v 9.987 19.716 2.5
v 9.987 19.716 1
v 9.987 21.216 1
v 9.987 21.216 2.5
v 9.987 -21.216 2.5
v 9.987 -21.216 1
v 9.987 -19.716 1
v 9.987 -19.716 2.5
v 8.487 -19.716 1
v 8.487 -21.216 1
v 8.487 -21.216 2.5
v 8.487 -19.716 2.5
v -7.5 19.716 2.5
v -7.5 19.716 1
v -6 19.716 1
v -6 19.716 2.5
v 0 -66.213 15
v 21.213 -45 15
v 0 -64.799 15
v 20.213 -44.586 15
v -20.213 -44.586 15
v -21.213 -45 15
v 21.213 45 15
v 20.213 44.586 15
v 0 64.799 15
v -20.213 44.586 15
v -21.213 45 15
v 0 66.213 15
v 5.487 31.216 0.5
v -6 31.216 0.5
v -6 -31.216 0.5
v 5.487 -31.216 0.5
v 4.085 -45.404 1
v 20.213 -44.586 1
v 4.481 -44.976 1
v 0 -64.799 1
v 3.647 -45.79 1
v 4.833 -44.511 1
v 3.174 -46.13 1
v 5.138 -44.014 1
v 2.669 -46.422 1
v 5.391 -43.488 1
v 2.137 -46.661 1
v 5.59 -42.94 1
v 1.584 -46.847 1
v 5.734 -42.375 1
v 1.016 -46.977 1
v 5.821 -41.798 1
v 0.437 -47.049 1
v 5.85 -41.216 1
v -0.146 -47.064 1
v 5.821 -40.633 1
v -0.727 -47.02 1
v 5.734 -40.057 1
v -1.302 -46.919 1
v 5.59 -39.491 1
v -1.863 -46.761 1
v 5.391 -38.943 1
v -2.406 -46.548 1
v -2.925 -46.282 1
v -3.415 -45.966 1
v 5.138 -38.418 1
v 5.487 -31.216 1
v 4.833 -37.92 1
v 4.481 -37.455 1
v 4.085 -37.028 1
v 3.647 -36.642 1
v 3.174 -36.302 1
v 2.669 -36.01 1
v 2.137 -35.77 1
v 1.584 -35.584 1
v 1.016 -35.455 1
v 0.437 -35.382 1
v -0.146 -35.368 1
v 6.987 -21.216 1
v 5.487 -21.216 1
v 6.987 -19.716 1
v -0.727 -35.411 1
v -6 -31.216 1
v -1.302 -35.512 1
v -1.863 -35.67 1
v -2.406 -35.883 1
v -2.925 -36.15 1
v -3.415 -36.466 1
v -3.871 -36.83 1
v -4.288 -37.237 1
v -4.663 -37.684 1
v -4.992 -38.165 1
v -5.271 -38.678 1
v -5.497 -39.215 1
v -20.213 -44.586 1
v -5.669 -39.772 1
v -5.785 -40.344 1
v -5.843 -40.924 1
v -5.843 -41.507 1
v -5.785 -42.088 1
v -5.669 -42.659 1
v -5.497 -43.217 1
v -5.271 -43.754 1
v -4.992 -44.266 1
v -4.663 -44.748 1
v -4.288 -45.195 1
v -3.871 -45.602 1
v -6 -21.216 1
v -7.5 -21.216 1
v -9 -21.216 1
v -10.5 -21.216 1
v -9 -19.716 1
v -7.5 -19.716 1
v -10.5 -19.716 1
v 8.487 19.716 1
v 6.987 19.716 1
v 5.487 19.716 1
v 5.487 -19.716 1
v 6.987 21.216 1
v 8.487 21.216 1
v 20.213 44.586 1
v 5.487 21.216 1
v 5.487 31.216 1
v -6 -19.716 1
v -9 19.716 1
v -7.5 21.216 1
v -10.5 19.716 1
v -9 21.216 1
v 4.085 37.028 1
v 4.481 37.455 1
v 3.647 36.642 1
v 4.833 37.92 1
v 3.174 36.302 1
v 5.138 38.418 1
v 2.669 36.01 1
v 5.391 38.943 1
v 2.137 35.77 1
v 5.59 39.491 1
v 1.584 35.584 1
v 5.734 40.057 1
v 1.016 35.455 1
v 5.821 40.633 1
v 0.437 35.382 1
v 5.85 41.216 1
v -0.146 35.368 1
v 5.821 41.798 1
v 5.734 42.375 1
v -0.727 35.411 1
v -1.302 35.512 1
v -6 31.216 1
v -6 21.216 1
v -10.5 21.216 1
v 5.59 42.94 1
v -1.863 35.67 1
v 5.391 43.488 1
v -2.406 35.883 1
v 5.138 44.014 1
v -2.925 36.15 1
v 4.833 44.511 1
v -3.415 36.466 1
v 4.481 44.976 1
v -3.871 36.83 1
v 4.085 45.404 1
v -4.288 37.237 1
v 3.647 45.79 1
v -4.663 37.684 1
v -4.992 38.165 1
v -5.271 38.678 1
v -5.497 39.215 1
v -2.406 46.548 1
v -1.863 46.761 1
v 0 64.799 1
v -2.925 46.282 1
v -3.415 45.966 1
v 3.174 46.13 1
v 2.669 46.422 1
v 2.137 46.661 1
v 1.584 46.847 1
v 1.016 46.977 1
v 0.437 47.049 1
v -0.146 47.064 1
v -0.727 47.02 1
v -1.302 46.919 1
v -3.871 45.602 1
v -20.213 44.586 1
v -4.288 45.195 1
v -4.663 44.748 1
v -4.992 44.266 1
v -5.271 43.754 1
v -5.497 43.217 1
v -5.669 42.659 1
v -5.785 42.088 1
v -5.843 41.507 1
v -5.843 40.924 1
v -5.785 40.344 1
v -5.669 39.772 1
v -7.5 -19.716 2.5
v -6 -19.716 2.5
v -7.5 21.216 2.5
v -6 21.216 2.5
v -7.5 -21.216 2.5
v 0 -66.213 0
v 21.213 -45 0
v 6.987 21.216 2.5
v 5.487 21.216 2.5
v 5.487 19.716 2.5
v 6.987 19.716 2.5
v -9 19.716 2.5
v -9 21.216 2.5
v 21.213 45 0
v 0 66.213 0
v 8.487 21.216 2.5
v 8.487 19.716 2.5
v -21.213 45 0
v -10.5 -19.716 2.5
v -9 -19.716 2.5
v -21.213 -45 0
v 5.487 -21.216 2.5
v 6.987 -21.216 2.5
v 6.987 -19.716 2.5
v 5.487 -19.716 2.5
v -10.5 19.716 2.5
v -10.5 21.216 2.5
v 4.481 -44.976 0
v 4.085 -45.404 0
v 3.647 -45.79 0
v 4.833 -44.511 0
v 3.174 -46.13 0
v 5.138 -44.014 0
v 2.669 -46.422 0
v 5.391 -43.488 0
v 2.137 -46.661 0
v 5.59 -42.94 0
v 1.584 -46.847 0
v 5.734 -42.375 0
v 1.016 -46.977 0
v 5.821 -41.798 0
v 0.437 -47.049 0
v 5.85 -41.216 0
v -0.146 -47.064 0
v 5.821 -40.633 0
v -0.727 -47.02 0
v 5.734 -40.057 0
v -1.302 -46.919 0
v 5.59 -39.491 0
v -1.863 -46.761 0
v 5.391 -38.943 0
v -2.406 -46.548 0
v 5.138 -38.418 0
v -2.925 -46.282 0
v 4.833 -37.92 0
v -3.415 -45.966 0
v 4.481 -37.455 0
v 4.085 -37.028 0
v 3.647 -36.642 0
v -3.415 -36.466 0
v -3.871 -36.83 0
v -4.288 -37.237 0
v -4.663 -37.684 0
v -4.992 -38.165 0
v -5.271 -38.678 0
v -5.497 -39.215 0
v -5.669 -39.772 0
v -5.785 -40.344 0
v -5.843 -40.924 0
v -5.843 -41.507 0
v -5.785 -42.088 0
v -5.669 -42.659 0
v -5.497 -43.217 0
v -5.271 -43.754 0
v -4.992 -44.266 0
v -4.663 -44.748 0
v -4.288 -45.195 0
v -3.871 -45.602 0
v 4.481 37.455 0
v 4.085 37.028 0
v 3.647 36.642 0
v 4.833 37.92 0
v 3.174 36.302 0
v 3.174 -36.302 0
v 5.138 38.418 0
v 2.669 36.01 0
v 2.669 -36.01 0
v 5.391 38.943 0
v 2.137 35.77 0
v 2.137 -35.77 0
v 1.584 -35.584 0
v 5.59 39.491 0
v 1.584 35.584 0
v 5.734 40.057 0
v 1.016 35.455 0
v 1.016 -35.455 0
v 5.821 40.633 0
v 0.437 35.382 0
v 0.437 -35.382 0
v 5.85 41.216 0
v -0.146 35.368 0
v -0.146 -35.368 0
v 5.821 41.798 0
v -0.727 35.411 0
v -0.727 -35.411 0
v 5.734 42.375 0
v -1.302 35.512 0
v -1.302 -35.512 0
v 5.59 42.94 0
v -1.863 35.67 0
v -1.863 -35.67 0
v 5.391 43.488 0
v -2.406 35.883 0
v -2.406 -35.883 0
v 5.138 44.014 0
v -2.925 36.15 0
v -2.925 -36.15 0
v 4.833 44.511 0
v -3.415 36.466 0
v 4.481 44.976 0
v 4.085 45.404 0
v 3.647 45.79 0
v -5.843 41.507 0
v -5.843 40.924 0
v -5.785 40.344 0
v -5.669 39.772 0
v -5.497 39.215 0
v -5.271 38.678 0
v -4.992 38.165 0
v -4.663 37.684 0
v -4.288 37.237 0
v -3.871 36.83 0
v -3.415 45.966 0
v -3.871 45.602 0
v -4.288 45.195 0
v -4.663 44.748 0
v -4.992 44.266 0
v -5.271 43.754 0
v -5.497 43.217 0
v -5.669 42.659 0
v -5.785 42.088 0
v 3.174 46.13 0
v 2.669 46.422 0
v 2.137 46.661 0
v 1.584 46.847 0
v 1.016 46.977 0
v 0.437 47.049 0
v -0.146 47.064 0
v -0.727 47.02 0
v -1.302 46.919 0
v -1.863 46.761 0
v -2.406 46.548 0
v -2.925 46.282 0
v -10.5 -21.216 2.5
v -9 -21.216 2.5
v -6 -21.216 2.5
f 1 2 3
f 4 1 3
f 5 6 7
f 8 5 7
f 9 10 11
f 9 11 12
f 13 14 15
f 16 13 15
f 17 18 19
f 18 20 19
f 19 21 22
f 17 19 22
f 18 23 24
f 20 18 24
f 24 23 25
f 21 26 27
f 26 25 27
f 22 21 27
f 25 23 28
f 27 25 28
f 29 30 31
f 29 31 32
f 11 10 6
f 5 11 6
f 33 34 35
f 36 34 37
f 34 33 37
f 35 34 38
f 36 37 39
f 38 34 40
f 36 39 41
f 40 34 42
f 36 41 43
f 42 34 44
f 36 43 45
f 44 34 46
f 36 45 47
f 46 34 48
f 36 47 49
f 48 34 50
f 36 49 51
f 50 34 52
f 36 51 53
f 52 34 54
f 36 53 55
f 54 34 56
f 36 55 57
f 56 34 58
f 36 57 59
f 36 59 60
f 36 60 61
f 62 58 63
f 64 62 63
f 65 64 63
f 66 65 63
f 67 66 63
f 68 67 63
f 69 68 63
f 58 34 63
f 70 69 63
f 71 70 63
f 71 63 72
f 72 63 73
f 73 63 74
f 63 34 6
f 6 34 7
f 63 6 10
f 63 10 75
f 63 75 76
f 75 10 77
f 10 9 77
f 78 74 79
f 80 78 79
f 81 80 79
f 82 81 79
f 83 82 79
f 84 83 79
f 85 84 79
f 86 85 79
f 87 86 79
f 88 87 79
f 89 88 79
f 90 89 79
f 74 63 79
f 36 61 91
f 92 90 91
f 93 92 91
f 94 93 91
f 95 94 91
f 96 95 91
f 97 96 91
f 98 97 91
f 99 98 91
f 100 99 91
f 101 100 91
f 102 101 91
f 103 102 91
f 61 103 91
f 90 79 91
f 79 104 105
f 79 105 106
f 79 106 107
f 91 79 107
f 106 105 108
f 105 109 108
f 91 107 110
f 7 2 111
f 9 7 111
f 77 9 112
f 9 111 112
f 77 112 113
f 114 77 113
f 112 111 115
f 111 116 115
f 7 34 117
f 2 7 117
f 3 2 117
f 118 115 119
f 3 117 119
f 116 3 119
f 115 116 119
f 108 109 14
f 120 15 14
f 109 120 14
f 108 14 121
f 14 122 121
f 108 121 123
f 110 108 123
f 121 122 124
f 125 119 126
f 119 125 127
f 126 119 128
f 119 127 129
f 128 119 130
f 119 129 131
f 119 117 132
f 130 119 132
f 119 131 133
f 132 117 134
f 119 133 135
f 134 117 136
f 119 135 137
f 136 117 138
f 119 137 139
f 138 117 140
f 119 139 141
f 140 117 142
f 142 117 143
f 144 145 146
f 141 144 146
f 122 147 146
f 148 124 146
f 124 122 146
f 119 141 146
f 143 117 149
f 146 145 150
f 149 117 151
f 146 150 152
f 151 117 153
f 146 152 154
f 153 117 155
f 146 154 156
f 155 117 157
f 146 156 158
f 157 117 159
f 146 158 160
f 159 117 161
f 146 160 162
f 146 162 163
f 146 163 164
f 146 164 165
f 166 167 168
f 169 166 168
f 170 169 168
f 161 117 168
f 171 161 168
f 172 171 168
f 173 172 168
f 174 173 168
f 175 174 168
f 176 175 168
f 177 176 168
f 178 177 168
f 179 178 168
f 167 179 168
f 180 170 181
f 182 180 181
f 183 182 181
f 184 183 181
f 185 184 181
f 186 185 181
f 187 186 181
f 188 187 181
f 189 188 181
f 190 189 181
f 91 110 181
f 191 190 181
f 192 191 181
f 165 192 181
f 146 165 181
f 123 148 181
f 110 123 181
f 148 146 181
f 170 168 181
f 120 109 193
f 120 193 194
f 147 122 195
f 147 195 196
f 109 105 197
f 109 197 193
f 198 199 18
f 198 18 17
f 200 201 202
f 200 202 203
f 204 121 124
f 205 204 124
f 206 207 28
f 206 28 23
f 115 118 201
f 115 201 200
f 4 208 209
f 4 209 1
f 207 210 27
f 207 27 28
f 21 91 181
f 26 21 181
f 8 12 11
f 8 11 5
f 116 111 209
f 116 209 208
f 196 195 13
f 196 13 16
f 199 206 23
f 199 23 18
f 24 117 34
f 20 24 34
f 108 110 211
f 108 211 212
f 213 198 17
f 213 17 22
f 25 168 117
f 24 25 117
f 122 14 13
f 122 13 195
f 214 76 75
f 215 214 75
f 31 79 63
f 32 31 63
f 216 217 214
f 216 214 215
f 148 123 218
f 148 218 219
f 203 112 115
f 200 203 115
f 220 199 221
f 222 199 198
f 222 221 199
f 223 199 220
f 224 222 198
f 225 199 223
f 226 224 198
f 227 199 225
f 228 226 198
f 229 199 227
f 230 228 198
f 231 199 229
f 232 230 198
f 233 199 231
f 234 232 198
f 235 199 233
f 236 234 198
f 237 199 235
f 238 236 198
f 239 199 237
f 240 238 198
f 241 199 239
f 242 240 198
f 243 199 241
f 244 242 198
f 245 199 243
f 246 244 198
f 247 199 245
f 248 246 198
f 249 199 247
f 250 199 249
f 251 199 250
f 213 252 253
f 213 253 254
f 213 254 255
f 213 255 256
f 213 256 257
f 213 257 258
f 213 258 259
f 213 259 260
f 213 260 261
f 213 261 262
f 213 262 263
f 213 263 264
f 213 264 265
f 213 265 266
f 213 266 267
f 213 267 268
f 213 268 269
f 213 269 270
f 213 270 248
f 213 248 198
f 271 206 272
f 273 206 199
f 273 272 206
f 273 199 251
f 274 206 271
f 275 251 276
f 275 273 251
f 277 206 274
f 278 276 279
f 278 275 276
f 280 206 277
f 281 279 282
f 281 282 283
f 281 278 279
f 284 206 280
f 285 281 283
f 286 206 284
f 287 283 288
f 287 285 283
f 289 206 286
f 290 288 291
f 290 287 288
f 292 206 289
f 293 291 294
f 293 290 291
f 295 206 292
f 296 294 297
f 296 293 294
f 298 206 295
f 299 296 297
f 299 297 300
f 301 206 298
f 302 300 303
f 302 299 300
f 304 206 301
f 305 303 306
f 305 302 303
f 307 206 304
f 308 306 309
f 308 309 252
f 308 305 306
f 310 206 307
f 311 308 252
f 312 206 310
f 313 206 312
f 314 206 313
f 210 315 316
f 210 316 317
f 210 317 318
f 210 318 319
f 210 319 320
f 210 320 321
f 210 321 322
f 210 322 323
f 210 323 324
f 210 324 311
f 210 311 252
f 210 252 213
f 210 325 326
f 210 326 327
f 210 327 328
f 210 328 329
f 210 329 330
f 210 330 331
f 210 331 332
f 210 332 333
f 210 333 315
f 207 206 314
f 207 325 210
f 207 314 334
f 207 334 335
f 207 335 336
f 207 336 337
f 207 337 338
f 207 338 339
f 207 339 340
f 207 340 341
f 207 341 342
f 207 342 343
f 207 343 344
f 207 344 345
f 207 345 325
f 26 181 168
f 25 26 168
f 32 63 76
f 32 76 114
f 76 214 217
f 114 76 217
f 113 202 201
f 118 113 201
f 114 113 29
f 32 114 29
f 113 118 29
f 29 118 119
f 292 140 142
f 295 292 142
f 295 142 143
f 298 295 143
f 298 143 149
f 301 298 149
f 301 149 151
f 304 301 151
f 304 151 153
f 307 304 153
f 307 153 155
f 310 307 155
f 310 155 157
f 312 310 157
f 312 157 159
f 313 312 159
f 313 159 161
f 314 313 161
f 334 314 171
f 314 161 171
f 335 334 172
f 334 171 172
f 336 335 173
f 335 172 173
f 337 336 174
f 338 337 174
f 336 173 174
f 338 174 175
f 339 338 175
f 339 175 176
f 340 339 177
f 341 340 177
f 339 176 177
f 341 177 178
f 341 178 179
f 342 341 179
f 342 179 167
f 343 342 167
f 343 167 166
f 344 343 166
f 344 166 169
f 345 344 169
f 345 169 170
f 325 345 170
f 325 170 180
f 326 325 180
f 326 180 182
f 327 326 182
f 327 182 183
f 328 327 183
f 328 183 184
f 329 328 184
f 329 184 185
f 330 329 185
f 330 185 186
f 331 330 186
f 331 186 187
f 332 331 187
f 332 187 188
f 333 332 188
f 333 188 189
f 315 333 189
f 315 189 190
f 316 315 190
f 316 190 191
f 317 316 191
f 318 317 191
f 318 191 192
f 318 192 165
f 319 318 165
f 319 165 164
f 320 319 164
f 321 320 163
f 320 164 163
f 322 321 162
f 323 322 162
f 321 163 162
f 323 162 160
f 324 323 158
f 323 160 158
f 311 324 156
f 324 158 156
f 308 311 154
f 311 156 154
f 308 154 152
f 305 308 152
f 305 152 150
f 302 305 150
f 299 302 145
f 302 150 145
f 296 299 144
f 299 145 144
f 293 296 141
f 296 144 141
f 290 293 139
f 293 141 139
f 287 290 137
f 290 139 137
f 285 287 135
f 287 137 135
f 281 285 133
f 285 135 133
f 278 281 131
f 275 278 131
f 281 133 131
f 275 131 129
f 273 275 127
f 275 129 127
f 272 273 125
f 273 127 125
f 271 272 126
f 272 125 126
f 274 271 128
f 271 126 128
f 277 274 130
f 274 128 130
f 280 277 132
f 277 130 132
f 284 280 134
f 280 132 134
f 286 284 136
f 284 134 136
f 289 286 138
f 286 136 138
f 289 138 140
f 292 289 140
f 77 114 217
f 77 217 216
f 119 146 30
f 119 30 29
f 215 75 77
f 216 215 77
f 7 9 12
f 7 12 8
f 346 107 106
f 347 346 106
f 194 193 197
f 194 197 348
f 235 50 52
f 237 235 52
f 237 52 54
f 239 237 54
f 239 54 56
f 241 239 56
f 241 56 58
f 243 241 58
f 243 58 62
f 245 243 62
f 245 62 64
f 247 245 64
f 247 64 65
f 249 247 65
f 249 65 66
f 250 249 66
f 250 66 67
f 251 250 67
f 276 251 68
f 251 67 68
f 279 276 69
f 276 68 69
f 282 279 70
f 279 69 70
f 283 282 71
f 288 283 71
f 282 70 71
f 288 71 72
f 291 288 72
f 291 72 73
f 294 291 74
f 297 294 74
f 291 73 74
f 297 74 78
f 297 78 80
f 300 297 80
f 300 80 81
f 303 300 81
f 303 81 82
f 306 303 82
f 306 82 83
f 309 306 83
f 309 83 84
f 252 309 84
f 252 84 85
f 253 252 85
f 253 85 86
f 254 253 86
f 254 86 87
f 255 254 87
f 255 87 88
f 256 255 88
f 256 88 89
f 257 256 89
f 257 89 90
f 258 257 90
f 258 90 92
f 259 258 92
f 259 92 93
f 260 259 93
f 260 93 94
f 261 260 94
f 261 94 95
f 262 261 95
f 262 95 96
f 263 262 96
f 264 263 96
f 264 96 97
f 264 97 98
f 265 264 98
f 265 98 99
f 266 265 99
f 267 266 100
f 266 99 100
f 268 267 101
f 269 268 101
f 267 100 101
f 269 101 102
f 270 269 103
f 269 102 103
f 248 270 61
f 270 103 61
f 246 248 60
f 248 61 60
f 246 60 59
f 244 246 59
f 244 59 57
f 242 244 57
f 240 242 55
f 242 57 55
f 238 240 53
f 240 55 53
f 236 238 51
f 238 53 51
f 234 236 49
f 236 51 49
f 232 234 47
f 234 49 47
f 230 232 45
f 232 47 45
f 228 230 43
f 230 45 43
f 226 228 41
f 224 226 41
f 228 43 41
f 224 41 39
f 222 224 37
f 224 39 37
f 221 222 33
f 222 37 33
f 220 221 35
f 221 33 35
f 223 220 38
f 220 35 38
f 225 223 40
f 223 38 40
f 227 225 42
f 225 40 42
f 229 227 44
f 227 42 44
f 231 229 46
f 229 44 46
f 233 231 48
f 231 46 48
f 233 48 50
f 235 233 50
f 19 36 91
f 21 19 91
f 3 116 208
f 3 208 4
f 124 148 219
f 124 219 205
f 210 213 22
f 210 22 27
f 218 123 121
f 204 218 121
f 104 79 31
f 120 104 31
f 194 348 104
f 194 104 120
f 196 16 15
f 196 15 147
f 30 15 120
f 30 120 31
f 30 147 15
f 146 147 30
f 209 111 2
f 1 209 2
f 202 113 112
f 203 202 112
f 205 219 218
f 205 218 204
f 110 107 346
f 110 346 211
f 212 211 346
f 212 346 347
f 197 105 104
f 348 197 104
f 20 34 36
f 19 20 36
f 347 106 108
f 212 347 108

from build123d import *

# Parameters (mm, degrees)
EXTRUDE_3_DEPTH                 = 15
EXTRUDE_2_DEPTH                 = 1
SKETCH_4_R                      = 5.85
CUT_EXTRUDE_1_DEPTH             = 2
SKIZZE1_W                       = 11.487069154
SKIZZE1_H                       = 62.431572876
SCHNITT_LINEAR_AUSTRAGEN1_DEPTH = 0.5
SKIZZE2_W                       = 1.5
SKIZZE2_H                       = 1.5
AUFSATZ_LINEAR_AUSTRAGEN1_DEPTH = 1.5


with BuildPart() as part:
    # Эскиз1 → Вытянуть-Тонкостенный3 (new body)
    with BuildSketch(Plane.XY):
        Polygon((-21.213203436, -45), (-21.213203436, 45), (0, 66.213203436), (21.213203436, 45), (21.213203436, -45), (0, -66.213203436), align=None)
        Polygon((-20.213203436, -44.585786438), (-20.213203436, 44.585786438), (0, 64.798989873), (20.213203436, 44.585786438), (20.213203436, -44.585786438), (0, -64.798989873), align=None, mode=Mode.SUBTRACT)
    extrude(amount=EXTRUDE_3_DEPTH)

    # Эскиз2 → Бобышка-Вытянуть2 (add)
    with BuildSketch(Plane(origin=(0, 0, 0), x_dir=(-1, 0, 0), z_dir=(0, 0, -1))):
        Polygon((-20.213203436, -44.585786438), (0, -64.798989873), (20.213203436, -44.585786438), (20.213203436, 44.585786438), (0, 64.798989873), (-20.213203436, 44.585786438), align=None)
    extrude(amount=-EXTRUDE_2_DEPTH)

    # Эскиз4 → Вырез-Вытянуть1 (cut)
    with BuildSketch(Plane.XY.offset(1)):
        with Locations((0, 41.215786438)):
            Circle(SKETCH_4_R)
        with Locations((0, -41.215786438)):
            Circle(SKETCH_4_R)
    extrude(amount=-CUT_EXTRUDE_1_DEPTH, mode=Mode.SUBTRACT)

    # Skizze1 → Schnitt-Linear austragen1 (cut)
    with BuildSketch(Plane.XY.offset(1)):
        with Locations((-0.256465423, 0)):
            Rectangle(SKIZZE1_W, SKIZZE1_H)
    extrude(amount=-SCHNITT_LINEAR_AUSTRAGEN1_DEPTH, mode=Mode.SUBTRACT)

    # Skizze2 → Aufsatz-Linear austragen1 (add)
    with BuildSketch(Plane.XY.offset(1)):
        with Locations((6.237069154, 20.465786438)):
            Rectangle(SKIZZE2_W, SKIZZE2_H)
        with Locations((9.237069154, 20.465786438)):
            Rectangle(SKIZZE2_W, SKIZZE2_H)
        with Locations((-6.75, 20.465786438)):
            Rectangle(SKIZZE2_W, SKIZZE2_H)
        with Locations((-9.75, 20.465786438)):
            Rectangle(SKIZZE2_W, SKIZZE2_H)
        with Locations((6.237069154, -20.465786438)):
            Rectangle(SKIZZE2_W, SKIZZE2_H)
        with Locations((9.237069154, -20.465786438)):
            Rectangle(SKIZZE2_W, SKIZZE2_H)
        with Locations((-6.75, -20.465786438)):
            Rectangle(SKIZZE2_W, SKIZZE2_H)
        with Locations((-9.75, -20.465786438)):
            Rectangle(SKIZZE2_W, SKIZZE2_H)
    extrude(amount=AUFSATZ_LINEAR_AUSTRAGEN1_DEPTH)


solid = part.part
